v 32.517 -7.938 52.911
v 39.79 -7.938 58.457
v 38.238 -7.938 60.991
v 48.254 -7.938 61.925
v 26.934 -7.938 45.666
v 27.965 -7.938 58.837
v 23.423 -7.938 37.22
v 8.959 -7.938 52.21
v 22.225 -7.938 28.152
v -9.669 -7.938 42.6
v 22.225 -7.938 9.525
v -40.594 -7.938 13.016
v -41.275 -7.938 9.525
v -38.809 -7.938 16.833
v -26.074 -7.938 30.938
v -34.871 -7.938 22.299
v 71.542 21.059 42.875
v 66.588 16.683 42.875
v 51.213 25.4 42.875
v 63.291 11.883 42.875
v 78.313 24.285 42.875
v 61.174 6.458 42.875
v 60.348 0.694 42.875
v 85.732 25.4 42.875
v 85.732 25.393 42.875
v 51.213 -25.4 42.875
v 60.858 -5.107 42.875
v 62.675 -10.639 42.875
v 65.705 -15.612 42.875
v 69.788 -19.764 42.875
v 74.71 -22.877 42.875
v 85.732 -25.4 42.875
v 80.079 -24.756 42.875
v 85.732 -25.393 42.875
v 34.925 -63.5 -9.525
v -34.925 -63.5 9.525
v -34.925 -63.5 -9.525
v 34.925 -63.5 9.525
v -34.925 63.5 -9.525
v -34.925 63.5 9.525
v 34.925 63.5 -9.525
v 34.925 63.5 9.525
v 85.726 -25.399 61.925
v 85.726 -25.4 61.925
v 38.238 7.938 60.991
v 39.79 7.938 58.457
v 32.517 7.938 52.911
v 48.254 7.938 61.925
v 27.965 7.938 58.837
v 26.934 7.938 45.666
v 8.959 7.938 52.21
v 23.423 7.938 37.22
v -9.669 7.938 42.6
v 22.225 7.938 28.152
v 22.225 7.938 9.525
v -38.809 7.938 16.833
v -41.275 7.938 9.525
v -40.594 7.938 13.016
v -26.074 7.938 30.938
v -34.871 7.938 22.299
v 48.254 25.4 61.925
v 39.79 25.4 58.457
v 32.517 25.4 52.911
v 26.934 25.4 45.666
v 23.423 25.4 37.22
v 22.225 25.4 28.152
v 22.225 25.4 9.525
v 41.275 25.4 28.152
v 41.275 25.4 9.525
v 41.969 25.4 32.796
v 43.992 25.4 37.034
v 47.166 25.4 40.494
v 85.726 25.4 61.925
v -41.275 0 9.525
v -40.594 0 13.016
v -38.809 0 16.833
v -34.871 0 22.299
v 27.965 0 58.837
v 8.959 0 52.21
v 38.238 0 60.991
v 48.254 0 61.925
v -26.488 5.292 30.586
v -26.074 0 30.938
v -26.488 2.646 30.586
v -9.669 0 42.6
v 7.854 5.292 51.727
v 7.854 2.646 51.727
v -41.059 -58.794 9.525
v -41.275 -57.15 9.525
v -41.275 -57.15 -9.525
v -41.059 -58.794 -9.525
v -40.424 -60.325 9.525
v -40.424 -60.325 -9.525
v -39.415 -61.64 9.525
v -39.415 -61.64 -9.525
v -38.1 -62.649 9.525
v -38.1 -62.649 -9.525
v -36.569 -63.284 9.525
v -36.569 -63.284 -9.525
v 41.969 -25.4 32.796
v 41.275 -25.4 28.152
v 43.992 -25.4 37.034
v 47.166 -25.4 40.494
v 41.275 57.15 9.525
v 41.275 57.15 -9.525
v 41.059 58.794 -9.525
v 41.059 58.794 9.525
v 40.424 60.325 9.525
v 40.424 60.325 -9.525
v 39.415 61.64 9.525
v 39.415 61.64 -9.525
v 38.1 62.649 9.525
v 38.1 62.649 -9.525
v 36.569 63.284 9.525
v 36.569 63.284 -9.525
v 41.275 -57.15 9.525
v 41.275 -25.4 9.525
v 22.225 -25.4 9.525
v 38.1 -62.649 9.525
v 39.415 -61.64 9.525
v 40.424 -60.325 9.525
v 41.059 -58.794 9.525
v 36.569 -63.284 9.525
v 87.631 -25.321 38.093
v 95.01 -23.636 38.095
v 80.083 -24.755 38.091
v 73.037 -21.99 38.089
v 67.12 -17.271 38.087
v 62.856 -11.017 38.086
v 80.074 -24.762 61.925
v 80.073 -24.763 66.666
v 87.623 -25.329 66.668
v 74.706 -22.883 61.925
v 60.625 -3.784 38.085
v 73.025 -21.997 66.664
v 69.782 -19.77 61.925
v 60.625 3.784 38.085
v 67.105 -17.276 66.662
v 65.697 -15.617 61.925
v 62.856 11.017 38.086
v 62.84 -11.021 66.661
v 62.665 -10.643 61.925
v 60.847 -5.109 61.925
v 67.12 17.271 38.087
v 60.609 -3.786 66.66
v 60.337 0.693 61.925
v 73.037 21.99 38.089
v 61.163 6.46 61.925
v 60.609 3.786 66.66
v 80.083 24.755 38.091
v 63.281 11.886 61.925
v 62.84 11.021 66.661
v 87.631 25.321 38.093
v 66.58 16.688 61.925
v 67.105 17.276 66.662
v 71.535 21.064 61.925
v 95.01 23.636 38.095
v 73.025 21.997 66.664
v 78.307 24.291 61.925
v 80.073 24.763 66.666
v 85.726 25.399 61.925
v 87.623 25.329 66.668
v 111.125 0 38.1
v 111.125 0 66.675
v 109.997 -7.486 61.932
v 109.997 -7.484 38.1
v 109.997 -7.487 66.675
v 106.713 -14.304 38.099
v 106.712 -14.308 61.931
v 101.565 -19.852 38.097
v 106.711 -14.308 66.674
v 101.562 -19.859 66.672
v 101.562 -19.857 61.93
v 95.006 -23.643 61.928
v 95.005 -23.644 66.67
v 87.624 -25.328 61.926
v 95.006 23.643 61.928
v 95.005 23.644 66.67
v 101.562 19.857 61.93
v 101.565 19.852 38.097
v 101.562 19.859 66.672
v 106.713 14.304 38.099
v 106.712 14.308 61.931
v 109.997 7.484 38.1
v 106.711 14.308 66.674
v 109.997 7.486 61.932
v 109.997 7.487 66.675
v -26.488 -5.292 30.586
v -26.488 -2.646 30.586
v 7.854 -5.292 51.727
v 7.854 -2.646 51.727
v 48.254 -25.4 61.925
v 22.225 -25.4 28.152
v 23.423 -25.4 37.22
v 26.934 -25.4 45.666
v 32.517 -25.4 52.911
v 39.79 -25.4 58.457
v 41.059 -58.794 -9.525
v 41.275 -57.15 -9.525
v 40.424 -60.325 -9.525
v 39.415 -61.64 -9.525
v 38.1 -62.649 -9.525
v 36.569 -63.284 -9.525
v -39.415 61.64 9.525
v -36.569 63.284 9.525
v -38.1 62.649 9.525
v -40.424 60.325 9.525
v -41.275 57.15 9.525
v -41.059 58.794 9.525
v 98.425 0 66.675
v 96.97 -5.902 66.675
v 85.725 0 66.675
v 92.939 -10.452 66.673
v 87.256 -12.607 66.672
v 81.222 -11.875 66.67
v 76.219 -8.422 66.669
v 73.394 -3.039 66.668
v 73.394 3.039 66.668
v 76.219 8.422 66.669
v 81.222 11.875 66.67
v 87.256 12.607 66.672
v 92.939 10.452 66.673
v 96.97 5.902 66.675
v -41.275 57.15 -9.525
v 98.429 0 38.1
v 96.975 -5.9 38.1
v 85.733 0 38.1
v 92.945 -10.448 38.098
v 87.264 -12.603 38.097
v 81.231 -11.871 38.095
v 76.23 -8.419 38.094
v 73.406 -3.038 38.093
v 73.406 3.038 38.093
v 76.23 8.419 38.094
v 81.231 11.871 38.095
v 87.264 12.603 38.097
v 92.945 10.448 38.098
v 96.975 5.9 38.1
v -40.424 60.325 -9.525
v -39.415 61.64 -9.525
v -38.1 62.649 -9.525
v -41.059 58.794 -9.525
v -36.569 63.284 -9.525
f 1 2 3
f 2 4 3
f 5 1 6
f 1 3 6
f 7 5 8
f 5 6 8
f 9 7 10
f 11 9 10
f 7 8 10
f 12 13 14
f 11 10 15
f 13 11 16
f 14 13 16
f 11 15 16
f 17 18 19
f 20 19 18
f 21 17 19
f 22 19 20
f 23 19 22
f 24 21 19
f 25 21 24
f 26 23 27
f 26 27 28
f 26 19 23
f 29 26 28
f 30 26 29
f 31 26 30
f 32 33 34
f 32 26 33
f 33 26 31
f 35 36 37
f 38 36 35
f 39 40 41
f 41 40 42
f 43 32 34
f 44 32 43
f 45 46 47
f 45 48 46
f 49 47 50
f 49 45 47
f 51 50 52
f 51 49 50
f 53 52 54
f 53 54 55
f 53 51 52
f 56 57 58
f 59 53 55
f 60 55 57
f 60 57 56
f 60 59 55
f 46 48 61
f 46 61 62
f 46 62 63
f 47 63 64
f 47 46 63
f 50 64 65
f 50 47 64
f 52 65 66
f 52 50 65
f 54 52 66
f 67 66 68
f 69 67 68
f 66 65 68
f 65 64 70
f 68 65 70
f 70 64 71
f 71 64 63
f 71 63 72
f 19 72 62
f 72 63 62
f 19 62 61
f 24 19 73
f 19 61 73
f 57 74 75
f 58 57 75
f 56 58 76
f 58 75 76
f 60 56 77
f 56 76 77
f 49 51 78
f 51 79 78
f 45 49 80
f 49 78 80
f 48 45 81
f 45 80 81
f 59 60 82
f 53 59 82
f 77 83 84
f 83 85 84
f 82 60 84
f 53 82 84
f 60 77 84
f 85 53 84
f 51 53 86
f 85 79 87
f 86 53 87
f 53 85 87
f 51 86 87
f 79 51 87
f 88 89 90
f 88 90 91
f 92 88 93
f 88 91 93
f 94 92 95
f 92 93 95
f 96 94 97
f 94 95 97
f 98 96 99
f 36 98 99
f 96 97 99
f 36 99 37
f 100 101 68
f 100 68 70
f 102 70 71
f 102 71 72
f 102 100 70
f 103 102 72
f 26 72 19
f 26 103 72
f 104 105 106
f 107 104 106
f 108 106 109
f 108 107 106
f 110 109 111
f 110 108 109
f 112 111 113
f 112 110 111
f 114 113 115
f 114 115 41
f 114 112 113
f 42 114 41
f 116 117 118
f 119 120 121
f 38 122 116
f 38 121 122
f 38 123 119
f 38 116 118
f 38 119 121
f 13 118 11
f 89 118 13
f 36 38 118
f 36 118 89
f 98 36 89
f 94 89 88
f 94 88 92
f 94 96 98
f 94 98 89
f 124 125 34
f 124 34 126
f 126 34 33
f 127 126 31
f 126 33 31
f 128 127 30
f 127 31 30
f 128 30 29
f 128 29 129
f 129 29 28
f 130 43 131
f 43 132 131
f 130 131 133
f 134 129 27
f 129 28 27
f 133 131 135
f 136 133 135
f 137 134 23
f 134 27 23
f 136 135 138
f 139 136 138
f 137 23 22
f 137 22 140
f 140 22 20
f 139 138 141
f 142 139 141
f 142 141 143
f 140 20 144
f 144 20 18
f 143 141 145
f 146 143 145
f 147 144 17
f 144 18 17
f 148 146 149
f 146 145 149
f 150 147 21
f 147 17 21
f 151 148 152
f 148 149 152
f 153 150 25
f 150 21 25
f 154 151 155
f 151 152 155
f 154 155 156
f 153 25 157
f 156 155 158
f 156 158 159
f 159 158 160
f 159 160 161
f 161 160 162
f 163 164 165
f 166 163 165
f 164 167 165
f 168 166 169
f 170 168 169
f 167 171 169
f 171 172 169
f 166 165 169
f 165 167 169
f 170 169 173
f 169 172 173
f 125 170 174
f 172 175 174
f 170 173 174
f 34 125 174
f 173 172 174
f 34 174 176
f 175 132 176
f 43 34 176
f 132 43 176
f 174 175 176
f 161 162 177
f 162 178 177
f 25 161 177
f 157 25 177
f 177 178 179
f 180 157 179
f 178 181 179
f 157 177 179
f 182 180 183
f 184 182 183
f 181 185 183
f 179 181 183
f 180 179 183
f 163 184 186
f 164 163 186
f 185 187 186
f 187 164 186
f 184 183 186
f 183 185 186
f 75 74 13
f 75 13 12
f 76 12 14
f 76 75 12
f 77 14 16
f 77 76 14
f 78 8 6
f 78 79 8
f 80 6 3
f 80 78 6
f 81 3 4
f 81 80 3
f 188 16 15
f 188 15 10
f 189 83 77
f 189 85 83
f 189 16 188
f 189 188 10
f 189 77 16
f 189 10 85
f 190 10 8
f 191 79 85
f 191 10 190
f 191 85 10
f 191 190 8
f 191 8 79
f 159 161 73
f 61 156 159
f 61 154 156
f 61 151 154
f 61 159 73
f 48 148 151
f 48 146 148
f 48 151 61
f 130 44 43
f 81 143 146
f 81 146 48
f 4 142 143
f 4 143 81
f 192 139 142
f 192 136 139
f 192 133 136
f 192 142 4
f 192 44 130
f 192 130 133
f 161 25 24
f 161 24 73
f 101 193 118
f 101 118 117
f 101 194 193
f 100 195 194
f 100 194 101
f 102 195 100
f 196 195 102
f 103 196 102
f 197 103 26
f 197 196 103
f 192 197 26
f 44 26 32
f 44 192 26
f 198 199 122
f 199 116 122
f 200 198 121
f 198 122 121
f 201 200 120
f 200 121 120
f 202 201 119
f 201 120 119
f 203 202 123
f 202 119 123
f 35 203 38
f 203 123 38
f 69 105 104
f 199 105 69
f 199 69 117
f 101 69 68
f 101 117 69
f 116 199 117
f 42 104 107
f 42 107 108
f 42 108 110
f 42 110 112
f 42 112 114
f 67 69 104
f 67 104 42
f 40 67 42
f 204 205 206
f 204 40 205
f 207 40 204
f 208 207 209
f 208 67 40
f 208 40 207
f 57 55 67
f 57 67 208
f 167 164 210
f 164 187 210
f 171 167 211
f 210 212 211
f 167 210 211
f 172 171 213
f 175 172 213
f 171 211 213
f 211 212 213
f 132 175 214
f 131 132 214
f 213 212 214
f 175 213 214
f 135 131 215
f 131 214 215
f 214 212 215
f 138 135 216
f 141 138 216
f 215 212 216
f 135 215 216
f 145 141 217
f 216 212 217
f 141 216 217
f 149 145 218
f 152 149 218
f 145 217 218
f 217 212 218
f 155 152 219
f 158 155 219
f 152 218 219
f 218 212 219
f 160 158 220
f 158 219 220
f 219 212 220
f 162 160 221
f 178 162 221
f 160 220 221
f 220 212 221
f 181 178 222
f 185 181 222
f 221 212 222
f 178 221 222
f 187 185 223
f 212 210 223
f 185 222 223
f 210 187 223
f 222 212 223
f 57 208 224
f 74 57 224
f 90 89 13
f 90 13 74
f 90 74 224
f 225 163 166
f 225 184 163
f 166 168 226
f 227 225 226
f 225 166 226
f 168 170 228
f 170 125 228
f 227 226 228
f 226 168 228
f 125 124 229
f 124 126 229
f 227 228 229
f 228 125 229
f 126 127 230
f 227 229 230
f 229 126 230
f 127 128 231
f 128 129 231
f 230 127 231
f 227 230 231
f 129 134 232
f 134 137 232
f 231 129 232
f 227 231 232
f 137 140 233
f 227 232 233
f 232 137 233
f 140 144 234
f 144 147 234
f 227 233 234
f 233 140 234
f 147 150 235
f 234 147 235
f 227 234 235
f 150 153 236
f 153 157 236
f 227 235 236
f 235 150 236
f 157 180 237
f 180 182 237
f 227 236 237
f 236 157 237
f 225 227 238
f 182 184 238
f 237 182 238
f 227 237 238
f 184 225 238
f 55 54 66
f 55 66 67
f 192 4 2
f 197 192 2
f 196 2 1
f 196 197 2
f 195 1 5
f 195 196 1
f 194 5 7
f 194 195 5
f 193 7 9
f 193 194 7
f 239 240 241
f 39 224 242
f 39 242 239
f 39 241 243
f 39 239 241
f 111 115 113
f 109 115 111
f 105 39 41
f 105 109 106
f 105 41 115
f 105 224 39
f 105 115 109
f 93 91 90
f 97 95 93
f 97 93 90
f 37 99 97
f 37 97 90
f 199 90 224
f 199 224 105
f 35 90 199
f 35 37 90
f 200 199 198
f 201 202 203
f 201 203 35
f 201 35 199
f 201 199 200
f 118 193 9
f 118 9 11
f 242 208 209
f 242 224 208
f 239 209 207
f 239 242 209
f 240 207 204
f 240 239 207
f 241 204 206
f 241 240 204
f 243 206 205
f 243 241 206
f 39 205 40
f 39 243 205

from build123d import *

# Parameters (mm, degrees)
F1_DEPTH = 25.4
F2_DEPTH = 63.5
F3_DEPTH = 7.9375
F5_R     = 6.35


with BuildPart() as f1:
    # F0 (on Front) → F1 (new body, symmetric)
    with BuildSketch(Plane.XZ):
        with BuildLine():
            Line((22.225, 28.1521443485), (22.225, 9.525))
            Line((22.225, 9.525), (41.275, 9.525))
            Line((41.275, 9.525), (41.275, 28.1521443485))
            ThreePointArc((41.275, 28.1521443485), (43.992026211, 37.0337743098), (51.2130599394, 42.8752))
            Line((51.2130599394, 42.8752), (60.325, 42.8752))
            Line((60.325, 42.8752), (60.325, 61.9252))
            Line((60.325, 61.9252), (48.2541393355, 61.9252))
            ThreePointArc((48.2541393355, 61.9252), (29.4873576939, 49.4719437295), (22.225, 28.1521443485))
        make_face()
        Polygon((85.7263787281, 61.9252), (60.325, 61.9252), (60.325, 42.8752), (85.7319083861, 42.8752), align=None)
    extrude(amount=F1_DEPTH, both=True)

    # F0 (on Front) → F2 (join, symmetric)
    with BuildSketch(Plane.XZ):
        Polygon((22.225, 9.525), (-41.275, 9.525), (-41.275, -9.525), (41.275, -9.525), (41.275, 9.525), align=None)
    extrude(amount=F2_DEPTH, both=True)

    # F0 (on Front) → F3 (join, symmetric)
    with BuildSketch(Plane.XZ):
        with BuildLine():
            add(Edge.make_bspline(
                [(-41.275, 9.525), (-40.7644435763, 26.8716271967), (9.3228099868, 60.8724653721), (48.2541393355, 61.9252)],
                knots=[0, 0, 0, 0, 103.7364340538, 103.7364340538, 103.7364340538, 103.7364340538], degree=3))
            Line((-41.275, 9.525), (22.225, 9.525))
            Line((22.225, 9.525), (22.225, 28.1521443485))
            ThreePointArc((22.225, 28.1521443485), (29.4873576939, 49.4719437295), (48.2541393355, 61.9252))
        make_face()
    extrude(amount=F3_DEPTH, both=True)

    # F0 (on Front) → F4 (revolve)
    with BuildSketch(Plane.XZ):
        Polygon((85.725, 66.675), (85.7263787281, 61.9252), (85.7319083861, 42.8752), (85.733294487, 38.1), (111.125, 38.1), (111.125, 66.675), align=None)
    revolve(axis=Axis((85.7291472435, 0, 52.3875), (0.0002902707, 0, -0.9999999579)))

    # F5
    f5_edges = [f1.edges().sort_by_distance(p)[0] for p in [
        (-41.275, -63.5, 0),
        (41.275, -63.5, 0),
        (-41.275, 63.5, 0),
        (41.275, 63.5, 0),
    ]]
    fillet(f5_edges, radius=F5_R)


solid = f1.part
